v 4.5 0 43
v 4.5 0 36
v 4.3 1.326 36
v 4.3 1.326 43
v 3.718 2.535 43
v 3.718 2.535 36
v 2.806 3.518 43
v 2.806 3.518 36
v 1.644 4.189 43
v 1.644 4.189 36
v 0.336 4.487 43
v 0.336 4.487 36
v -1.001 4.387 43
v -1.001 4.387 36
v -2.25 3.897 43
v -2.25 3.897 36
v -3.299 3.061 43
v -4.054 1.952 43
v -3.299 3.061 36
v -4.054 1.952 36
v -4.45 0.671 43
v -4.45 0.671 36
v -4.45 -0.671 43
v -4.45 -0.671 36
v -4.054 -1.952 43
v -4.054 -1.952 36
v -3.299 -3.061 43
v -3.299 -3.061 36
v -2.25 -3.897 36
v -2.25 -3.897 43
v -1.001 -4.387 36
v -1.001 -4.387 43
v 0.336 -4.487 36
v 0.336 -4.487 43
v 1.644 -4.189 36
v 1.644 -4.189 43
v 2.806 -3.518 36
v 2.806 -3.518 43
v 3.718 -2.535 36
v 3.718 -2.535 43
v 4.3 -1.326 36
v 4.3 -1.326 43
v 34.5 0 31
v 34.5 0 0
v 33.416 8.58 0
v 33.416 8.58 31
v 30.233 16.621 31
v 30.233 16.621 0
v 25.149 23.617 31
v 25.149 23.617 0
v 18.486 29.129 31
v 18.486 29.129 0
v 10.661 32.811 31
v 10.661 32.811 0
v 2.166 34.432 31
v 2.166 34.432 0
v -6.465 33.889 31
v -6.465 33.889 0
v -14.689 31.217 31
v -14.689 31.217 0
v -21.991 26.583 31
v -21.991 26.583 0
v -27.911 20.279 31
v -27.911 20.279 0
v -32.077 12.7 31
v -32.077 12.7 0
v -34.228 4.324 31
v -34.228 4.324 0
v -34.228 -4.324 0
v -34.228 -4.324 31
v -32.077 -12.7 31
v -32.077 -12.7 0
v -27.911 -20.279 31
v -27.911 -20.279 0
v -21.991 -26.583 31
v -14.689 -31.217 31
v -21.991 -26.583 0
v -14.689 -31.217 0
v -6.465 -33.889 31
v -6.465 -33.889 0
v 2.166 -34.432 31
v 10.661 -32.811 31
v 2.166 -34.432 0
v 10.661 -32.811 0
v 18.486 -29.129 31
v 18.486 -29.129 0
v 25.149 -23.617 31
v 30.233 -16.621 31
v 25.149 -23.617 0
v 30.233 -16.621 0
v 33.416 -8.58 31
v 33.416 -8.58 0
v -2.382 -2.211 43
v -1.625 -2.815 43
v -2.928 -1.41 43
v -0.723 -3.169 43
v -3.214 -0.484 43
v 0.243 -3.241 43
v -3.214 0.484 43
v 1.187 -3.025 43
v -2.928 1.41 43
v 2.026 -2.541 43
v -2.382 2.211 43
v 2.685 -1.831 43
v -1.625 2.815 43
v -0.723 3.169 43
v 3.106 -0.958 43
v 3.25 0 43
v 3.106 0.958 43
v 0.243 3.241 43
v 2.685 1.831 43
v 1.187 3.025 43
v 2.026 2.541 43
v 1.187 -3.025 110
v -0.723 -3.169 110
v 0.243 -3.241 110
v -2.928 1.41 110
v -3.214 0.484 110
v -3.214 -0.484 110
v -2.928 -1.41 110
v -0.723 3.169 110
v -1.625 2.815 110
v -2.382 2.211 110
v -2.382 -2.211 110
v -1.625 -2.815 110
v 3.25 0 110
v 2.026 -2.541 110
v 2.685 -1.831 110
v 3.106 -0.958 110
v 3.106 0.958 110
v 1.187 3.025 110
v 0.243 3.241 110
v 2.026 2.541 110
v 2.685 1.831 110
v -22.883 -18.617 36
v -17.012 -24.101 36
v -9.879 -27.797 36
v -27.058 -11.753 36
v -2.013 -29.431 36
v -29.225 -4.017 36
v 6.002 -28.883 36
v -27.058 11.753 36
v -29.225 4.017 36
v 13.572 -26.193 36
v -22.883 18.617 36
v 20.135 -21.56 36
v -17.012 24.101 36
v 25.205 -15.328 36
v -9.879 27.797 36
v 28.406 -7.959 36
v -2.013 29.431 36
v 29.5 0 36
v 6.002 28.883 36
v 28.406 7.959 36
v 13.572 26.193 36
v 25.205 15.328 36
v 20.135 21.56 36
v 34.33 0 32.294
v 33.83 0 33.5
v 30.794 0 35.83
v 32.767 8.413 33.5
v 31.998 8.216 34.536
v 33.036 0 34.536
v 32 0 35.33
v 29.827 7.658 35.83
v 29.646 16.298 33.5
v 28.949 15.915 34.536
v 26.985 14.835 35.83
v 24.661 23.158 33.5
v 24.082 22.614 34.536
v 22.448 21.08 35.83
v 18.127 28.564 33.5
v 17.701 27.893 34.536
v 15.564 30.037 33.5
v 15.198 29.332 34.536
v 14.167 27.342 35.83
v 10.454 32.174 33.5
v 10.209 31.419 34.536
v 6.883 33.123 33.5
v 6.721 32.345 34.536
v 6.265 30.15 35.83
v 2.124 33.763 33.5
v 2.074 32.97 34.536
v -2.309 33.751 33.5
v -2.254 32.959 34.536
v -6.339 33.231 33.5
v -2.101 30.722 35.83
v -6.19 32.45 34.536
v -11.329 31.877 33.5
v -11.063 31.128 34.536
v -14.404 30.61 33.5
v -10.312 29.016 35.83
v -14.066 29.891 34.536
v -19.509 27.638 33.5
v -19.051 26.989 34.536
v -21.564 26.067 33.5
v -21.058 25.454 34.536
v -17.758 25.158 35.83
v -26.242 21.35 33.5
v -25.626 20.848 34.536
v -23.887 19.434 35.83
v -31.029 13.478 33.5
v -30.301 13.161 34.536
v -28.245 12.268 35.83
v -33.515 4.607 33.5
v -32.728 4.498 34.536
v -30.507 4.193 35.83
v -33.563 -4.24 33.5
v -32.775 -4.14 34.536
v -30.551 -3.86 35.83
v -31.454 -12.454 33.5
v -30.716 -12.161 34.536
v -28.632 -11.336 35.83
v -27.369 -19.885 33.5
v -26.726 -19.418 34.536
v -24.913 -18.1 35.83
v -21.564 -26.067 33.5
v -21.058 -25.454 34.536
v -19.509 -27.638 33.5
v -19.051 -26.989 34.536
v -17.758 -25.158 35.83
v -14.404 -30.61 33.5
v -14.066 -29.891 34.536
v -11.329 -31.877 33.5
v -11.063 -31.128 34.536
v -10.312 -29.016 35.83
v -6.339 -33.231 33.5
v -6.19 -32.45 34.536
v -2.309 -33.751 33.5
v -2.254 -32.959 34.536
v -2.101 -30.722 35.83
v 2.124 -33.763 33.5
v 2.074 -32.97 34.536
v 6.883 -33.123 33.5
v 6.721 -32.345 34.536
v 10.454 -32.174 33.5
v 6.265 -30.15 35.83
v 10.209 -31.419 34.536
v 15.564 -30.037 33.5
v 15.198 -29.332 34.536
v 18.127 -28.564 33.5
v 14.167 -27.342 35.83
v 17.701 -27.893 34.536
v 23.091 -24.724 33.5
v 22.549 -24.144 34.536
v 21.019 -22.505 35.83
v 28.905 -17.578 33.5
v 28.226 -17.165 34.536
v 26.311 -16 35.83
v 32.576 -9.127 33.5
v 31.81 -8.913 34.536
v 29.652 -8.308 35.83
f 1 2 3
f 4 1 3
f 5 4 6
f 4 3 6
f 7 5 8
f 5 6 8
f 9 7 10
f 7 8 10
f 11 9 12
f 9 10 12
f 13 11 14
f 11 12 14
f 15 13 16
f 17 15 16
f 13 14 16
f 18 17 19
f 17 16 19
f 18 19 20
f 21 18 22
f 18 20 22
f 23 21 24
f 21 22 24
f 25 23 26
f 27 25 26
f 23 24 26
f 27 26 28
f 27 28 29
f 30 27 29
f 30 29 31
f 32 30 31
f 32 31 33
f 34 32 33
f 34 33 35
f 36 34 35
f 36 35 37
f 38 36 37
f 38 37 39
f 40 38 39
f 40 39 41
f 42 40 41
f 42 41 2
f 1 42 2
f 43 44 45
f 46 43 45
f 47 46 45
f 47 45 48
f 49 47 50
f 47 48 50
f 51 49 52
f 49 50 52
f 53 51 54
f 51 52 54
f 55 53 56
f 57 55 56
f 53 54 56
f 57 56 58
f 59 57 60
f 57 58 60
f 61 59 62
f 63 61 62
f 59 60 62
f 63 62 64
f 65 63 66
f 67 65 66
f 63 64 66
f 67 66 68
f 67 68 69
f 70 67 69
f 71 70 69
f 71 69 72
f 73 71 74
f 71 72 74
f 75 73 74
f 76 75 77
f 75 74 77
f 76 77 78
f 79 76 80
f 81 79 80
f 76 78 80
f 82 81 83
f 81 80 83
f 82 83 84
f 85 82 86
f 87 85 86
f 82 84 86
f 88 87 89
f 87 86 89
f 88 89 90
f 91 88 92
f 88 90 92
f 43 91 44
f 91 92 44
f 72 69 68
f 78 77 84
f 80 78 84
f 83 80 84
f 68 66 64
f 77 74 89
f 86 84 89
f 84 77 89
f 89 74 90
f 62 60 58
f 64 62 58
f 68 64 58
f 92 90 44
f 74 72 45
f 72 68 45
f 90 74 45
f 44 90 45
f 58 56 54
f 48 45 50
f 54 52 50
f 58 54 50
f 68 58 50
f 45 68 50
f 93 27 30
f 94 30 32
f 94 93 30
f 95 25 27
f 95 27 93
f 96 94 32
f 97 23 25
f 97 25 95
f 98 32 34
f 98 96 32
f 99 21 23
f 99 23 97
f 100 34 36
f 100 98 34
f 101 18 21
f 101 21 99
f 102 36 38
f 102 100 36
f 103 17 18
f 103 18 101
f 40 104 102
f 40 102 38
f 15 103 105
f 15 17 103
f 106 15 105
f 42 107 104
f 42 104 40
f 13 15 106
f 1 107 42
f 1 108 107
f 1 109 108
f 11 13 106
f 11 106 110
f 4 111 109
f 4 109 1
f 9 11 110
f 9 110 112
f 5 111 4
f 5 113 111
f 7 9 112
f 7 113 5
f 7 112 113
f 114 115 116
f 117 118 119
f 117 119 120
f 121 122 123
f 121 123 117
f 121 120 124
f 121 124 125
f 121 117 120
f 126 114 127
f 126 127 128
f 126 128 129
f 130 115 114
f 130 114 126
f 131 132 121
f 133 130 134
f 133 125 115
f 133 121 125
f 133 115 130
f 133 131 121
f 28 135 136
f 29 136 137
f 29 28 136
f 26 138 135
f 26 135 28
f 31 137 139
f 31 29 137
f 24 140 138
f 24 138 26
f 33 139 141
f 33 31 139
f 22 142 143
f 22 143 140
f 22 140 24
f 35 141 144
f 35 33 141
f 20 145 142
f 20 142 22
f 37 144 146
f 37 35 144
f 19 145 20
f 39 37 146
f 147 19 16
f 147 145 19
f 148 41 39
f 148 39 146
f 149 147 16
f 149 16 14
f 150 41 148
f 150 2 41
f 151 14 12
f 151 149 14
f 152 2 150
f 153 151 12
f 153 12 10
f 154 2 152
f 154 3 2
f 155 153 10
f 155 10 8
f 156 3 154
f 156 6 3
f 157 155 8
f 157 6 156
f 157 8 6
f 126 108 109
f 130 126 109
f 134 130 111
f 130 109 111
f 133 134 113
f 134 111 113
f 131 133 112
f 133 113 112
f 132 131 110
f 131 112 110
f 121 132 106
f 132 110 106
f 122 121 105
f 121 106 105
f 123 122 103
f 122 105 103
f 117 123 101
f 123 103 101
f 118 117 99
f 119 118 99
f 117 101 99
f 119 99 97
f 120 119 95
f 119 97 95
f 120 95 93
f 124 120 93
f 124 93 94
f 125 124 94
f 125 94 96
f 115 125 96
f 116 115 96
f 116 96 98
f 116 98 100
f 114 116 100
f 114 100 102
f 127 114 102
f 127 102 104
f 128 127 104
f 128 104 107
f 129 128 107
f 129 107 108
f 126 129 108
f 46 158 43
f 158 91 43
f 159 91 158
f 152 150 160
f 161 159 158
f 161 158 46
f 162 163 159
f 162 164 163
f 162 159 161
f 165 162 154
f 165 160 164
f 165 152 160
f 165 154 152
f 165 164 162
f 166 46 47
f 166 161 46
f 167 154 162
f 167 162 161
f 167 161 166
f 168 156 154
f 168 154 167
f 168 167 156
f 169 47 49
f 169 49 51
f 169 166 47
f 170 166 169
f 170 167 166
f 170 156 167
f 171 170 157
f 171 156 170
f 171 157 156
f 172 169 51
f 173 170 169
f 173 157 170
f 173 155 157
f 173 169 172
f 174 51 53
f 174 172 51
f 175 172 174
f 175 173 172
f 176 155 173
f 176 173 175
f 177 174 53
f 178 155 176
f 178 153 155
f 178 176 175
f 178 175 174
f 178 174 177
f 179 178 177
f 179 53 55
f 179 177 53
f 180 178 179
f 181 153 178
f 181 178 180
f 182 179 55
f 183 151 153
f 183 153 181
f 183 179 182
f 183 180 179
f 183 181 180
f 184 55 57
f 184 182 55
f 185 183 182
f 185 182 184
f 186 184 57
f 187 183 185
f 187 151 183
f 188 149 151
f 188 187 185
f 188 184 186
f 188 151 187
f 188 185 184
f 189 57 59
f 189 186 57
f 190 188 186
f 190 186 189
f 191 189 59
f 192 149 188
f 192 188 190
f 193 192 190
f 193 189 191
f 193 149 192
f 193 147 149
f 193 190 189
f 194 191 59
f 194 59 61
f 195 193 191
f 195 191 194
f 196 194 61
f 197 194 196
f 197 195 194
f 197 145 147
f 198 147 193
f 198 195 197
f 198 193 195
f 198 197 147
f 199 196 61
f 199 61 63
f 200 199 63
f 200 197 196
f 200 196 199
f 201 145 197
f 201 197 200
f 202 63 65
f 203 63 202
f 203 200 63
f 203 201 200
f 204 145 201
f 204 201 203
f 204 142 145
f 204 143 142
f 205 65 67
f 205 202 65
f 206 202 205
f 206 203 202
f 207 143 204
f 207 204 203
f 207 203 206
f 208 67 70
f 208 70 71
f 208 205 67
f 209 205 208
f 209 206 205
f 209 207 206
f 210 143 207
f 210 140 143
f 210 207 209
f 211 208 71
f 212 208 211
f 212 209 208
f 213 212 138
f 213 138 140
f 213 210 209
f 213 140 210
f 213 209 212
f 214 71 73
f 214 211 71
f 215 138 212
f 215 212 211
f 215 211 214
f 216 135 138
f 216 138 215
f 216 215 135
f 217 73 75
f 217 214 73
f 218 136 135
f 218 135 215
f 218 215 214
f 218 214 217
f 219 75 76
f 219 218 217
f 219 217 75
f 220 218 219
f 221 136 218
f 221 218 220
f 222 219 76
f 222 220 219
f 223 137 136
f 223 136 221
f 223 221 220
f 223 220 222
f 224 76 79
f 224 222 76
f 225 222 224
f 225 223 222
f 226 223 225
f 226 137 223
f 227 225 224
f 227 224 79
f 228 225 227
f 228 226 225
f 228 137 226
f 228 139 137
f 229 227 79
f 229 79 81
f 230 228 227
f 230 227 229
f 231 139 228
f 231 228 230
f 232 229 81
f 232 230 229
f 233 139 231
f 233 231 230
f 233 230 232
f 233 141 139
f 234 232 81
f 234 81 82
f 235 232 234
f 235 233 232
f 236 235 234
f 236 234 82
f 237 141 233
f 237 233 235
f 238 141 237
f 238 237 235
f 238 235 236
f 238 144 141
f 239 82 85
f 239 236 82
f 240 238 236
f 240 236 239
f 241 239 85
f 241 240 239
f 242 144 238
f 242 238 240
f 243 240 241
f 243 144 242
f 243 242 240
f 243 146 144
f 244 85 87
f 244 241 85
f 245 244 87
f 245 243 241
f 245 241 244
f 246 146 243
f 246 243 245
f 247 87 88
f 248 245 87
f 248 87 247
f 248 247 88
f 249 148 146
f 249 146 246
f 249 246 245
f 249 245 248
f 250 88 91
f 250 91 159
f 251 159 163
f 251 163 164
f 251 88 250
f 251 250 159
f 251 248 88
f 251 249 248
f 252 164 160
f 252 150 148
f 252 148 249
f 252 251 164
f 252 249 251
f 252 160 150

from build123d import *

# Parameters (mm, degrees)
F1_R     = 3.25
F3_DEPTH = 110
F0_R     = 34.5
F4_DEPTH = 36
F2_R     = 4.5
F5_DEPTH = 43
F6_R     = 5


with BuildPart() as f3:
    # F1 (on Top) → F3 (new body)
    with BuildSketch(Plane.XY):
        Circle(F1_R)
    extrude(amount=F3_DEPTH)

    # F0 (on Top) → F4 (join)
    with BuildSketch(Plane.XY):
        Circle(F0_R)
    extrude(amount=F4_DEPTH)

    # F2 (on Top) → F5 (join)
    with BuildSketch(Plane.XY):
        Circle(F2_R)
    extrude(amount=F5_DEPTH)

    # F6
    f6_edges = [f3.edges().sort_by_distance(p)[0] for p in [
        (-34.5, 0, 36),
    ]]
    fillet(f6_edges, radius=F6_R)


solid = f3.part
